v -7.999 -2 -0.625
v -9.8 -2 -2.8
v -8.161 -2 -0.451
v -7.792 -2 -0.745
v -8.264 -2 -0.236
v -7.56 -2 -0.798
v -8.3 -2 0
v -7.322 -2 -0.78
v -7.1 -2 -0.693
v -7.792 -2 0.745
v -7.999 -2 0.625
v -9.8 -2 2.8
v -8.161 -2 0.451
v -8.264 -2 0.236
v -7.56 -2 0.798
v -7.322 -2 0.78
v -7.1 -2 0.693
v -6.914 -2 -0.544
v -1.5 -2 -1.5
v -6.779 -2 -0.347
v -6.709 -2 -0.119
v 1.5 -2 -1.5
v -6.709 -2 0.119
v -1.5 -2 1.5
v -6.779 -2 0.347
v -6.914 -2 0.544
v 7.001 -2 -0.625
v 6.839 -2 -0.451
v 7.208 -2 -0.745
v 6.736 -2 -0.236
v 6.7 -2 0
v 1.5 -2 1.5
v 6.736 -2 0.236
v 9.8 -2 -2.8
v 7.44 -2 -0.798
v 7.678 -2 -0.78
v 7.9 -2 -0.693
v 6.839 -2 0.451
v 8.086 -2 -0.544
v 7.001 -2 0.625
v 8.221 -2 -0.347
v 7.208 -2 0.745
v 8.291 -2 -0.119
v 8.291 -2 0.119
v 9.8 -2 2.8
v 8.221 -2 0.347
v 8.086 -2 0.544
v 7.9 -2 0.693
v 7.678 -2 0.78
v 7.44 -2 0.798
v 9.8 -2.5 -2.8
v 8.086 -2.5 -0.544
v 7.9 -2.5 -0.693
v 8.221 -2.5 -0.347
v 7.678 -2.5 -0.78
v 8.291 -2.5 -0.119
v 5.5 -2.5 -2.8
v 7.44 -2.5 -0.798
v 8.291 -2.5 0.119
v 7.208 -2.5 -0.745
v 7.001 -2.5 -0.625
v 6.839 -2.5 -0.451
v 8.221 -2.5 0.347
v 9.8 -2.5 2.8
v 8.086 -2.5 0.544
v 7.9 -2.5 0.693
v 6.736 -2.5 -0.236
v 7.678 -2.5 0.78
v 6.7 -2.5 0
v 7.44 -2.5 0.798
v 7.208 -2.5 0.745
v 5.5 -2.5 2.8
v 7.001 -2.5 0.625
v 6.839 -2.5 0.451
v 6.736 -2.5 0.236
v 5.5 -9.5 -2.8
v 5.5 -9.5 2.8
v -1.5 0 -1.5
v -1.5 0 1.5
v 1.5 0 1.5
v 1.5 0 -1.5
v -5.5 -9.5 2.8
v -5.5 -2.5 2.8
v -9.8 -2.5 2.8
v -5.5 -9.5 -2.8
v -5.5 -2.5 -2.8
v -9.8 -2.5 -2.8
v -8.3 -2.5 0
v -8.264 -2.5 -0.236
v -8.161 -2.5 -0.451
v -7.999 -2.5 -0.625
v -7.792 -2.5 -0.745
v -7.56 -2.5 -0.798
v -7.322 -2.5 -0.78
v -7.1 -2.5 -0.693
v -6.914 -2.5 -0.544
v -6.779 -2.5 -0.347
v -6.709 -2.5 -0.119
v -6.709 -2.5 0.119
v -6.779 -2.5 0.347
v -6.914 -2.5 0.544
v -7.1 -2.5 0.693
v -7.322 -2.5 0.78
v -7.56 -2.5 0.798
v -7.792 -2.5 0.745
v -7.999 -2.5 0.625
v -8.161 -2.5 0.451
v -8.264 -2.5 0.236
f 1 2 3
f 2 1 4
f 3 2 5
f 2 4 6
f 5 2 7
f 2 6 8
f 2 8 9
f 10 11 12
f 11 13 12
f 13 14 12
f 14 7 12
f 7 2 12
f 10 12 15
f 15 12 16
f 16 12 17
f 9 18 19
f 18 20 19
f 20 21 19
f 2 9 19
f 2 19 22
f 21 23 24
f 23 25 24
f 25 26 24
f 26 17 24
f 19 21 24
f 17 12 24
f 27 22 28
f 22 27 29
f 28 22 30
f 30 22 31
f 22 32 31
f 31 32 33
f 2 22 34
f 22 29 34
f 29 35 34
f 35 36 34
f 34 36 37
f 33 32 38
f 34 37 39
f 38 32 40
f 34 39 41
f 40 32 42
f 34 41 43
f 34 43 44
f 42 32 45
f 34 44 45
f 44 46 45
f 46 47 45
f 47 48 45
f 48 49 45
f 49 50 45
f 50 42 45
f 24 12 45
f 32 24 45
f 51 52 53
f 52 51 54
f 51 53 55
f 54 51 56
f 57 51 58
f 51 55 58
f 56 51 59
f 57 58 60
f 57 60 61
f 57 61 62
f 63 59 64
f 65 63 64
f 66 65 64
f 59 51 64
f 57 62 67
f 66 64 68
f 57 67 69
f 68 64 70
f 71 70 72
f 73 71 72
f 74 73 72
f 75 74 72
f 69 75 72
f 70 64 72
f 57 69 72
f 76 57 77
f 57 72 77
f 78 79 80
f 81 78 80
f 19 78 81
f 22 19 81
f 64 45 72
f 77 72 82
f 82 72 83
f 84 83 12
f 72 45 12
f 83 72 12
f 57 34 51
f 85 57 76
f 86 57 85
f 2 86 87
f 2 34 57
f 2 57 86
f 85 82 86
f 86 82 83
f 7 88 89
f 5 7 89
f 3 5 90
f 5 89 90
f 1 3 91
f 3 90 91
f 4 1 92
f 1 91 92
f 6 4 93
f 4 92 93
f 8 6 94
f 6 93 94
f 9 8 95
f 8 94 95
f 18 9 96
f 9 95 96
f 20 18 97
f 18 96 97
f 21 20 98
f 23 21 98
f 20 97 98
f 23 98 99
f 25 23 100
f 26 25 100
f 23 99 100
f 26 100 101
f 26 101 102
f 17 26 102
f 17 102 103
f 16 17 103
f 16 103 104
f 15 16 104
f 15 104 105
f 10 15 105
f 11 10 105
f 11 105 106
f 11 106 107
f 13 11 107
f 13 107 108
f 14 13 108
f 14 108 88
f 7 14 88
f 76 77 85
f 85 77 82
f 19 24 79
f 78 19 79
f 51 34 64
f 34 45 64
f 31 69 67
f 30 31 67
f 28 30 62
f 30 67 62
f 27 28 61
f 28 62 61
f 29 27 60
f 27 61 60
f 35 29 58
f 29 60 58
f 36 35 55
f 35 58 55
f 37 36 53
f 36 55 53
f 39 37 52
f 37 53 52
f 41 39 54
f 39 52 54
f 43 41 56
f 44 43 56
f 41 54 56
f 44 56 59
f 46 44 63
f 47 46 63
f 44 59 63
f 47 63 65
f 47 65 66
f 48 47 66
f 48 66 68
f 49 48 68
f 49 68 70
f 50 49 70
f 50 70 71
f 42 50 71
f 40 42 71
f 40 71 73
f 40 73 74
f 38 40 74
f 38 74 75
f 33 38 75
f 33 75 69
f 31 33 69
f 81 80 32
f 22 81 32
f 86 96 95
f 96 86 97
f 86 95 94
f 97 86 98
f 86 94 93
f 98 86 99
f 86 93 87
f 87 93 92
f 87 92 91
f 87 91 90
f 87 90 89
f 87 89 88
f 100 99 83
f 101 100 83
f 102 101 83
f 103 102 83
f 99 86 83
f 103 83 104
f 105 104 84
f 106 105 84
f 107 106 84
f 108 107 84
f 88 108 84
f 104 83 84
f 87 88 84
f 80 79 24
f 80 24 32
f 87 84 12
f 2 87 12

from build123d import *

# Parameters (mm, degrees)
AUFSATZ_LINEAR_AUSTRAGEN1_DEPTH = 2.8
SCHNITT_LINEAR_START            = 1.5
SKIZZE2_W                       = 3
SKIZZE2_H                       = 2
SCHNITT_LINEAR_AUSTRAGEN1_DEPTH = 2.3
M2_GEWINDEBOHRUNG1_D            = 1.6


with BuildPart() as part:
    # Skizze1 → Aufsatz-Linear austragen1 (new body, symmetric)
    with BuildSketch(Plane.XY):
        Polygon((-9.8, -2), (-1.5, -2), (-1.5, 0), (1.5, 0), (1.5, -2), (9.8, -2), (9.8, -2.5), (5.5, -2.5), (5.5, -9.5), (-5.5, -9.5), (-5.5, -2.5), (-9.8, -2.5), align=None)
    extrude(amount=AUFSATZ_LINEAR_AUSTRAGEN1_DEPTH, both=True)

    # Skizze2 → Schnitt-Linear austragen1 (cut, through all)
    with BuildSketch(Plane.XY.offset(SCHNITT_LINEAR_START)):
        with Locations((0, -1)):
            Rectangle(SKIZZE2_W, SKIZZE2_H)
    schnitt_linear_austragen1 = extrude(amount=SCHNITT_LINEAR_AUSTRAGEN1_DEPTH, mode=Mode.SUBTRACT)

    # Spiegeln1: Schnitt-Linear austragen1 across plane
    add(schnitt_linear_austragen1.mirror(Plane.XY), mode=Mode.SUBTRACT)

    # M2 Gewindebohrung1 (through all)
    with Locations(Plane(origin=(0, -2, 0), x_dir=(1, 0, 0), z_dir=(0, 1, 0))):
        with Locations((-7.5, 0), (7.5, 0)):
            Hole(M2_GEWINDEBOHRUNG1_D / 2)


solid = part.part
